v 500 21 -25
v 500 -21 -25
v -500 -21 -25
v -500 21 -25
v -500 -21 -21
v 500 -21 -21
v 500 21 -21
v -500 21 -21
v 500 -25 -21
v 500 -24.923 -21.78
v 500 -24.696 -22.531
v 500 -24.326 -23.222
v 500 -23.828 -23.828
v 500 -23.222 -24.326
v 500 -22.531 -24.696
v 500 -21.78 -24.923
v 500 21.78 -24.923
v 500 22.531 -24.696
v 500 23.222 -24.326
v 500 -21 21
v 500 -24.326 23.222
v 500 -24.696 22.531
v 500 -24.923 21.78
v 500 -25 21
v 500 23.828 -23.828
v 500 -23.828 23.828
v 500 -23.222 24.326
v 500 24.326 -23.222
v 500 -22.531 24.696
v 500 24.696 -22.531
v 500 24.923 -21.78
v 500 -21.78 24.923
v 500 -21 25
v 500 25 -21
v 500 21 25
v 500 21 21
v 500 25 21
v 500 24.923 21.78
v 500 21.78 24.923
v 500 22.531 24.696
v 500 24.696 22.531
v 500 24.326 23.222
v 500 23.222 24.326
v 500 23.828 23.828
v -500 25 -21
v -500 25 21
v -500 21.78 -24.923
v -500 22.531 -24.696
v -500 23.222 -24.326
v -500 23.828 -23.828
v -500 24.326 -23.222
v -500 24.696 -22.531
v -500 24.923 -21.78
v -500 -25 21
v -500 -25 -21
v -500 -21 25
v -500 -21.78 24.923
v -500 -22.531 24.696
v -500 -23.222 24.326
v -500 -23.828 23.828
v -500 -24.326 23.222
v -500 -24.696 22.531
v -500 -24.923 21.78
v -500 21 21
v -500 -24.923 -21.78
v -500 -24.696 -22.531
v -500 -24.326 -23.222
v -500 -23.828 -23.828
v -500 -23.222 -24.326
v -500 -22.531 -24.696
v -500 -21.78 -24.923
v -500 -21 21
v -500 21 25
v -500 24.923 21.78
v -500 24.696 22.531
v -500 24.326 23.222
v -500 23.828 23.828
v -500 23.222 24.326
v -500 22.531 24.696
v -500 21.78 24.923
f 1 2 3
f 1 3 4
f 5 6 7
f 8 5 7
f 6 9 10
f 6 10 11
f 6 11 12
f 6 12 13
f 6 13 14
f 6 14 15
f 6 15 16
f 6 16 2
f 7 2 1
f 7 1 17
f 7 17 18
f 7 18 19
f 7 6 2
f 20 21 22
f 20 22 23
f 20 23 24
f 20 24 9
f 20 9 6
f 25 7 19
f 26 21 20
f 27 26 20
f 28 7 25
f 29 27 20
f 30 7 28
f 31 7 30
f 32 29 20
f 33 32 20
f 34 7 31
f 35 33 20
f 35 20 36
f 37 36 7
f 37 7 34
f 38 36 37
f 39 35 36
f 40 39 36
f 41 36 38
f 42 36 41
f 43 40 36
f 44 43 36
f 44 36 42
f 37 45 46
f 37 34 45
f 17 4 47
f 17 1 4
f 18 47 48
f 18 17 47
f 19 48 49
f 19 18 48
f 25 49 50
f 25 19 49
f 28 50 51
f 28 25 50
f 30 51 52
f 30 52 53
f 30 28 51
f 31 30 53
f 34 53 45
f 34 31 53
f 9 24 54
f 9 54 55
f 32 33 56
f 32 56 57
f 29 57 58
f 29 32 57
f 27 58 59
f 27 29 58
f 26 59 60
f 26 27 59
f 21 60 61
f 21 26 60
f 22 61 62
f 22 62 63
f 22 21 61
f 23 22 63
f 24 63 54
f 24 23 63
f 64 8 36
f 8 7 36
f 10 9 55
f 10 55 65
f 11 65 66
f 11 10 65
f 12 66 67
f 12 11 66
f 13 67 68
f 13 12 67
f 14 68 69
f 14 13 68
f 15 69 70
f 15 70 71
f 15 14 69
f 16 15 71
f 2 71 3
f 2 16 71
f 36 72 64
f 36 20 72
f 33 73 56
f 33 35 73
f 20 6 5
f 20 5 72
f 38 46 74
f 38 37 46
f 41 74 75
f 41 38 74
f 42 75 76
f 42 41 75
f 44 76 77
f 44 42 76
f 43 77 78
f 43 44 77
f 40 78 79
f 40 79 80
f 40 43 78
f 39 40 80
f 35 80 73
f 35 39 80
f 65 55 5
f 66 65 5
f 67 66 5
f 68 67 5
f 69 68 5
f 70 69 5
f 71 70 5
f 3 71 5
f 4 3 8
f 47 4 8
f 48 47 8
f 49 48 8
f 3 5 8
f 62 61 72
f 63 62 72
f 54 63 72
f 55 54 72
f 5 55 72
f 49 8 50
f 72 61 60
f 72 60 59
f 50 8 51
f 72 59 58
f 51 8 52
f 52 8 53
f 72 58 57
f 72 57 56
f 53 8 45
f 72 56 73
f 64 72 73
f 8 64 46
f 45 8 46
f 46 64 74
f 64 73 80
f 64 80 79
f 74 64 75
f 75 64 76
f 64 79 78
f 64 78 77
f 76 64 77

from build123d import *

# Parameters (mm, degrees)
F0_W     = 42
F0_H     = 42
F1_DEPTH = 500


with BuildPart() as f1:
    # F0 (on Right) → F1 (new body, symmetric)
    with BuildSketch(Plane.YZ):
        with BuildLine():
            Line((21, 25), (-21, 25))
            ThreePointArc((-21, 25), (-23.828427, 23.828427), (-25, 21))
            Line((-25, 21), (-25, -21))
            ThreePointArc((-25, -21), (-23.828427, -23.828427), (-21, -25))
            Line((-21, -25), (21, -25))
            ThreePointArc((21, -25), (23.828427, -23.828427), (25, -21))
            Line((25, -21), (25, 21))
            ThreePointArc((25, 21), (23.828427, 23.828427), (21, 25))
        make_face()
        Rectangle(F0_W, F0_H, mode=Mode.SUBTRACT)
    extrude(amount=F1_DEPTH, both=True)


solid = f1.part
